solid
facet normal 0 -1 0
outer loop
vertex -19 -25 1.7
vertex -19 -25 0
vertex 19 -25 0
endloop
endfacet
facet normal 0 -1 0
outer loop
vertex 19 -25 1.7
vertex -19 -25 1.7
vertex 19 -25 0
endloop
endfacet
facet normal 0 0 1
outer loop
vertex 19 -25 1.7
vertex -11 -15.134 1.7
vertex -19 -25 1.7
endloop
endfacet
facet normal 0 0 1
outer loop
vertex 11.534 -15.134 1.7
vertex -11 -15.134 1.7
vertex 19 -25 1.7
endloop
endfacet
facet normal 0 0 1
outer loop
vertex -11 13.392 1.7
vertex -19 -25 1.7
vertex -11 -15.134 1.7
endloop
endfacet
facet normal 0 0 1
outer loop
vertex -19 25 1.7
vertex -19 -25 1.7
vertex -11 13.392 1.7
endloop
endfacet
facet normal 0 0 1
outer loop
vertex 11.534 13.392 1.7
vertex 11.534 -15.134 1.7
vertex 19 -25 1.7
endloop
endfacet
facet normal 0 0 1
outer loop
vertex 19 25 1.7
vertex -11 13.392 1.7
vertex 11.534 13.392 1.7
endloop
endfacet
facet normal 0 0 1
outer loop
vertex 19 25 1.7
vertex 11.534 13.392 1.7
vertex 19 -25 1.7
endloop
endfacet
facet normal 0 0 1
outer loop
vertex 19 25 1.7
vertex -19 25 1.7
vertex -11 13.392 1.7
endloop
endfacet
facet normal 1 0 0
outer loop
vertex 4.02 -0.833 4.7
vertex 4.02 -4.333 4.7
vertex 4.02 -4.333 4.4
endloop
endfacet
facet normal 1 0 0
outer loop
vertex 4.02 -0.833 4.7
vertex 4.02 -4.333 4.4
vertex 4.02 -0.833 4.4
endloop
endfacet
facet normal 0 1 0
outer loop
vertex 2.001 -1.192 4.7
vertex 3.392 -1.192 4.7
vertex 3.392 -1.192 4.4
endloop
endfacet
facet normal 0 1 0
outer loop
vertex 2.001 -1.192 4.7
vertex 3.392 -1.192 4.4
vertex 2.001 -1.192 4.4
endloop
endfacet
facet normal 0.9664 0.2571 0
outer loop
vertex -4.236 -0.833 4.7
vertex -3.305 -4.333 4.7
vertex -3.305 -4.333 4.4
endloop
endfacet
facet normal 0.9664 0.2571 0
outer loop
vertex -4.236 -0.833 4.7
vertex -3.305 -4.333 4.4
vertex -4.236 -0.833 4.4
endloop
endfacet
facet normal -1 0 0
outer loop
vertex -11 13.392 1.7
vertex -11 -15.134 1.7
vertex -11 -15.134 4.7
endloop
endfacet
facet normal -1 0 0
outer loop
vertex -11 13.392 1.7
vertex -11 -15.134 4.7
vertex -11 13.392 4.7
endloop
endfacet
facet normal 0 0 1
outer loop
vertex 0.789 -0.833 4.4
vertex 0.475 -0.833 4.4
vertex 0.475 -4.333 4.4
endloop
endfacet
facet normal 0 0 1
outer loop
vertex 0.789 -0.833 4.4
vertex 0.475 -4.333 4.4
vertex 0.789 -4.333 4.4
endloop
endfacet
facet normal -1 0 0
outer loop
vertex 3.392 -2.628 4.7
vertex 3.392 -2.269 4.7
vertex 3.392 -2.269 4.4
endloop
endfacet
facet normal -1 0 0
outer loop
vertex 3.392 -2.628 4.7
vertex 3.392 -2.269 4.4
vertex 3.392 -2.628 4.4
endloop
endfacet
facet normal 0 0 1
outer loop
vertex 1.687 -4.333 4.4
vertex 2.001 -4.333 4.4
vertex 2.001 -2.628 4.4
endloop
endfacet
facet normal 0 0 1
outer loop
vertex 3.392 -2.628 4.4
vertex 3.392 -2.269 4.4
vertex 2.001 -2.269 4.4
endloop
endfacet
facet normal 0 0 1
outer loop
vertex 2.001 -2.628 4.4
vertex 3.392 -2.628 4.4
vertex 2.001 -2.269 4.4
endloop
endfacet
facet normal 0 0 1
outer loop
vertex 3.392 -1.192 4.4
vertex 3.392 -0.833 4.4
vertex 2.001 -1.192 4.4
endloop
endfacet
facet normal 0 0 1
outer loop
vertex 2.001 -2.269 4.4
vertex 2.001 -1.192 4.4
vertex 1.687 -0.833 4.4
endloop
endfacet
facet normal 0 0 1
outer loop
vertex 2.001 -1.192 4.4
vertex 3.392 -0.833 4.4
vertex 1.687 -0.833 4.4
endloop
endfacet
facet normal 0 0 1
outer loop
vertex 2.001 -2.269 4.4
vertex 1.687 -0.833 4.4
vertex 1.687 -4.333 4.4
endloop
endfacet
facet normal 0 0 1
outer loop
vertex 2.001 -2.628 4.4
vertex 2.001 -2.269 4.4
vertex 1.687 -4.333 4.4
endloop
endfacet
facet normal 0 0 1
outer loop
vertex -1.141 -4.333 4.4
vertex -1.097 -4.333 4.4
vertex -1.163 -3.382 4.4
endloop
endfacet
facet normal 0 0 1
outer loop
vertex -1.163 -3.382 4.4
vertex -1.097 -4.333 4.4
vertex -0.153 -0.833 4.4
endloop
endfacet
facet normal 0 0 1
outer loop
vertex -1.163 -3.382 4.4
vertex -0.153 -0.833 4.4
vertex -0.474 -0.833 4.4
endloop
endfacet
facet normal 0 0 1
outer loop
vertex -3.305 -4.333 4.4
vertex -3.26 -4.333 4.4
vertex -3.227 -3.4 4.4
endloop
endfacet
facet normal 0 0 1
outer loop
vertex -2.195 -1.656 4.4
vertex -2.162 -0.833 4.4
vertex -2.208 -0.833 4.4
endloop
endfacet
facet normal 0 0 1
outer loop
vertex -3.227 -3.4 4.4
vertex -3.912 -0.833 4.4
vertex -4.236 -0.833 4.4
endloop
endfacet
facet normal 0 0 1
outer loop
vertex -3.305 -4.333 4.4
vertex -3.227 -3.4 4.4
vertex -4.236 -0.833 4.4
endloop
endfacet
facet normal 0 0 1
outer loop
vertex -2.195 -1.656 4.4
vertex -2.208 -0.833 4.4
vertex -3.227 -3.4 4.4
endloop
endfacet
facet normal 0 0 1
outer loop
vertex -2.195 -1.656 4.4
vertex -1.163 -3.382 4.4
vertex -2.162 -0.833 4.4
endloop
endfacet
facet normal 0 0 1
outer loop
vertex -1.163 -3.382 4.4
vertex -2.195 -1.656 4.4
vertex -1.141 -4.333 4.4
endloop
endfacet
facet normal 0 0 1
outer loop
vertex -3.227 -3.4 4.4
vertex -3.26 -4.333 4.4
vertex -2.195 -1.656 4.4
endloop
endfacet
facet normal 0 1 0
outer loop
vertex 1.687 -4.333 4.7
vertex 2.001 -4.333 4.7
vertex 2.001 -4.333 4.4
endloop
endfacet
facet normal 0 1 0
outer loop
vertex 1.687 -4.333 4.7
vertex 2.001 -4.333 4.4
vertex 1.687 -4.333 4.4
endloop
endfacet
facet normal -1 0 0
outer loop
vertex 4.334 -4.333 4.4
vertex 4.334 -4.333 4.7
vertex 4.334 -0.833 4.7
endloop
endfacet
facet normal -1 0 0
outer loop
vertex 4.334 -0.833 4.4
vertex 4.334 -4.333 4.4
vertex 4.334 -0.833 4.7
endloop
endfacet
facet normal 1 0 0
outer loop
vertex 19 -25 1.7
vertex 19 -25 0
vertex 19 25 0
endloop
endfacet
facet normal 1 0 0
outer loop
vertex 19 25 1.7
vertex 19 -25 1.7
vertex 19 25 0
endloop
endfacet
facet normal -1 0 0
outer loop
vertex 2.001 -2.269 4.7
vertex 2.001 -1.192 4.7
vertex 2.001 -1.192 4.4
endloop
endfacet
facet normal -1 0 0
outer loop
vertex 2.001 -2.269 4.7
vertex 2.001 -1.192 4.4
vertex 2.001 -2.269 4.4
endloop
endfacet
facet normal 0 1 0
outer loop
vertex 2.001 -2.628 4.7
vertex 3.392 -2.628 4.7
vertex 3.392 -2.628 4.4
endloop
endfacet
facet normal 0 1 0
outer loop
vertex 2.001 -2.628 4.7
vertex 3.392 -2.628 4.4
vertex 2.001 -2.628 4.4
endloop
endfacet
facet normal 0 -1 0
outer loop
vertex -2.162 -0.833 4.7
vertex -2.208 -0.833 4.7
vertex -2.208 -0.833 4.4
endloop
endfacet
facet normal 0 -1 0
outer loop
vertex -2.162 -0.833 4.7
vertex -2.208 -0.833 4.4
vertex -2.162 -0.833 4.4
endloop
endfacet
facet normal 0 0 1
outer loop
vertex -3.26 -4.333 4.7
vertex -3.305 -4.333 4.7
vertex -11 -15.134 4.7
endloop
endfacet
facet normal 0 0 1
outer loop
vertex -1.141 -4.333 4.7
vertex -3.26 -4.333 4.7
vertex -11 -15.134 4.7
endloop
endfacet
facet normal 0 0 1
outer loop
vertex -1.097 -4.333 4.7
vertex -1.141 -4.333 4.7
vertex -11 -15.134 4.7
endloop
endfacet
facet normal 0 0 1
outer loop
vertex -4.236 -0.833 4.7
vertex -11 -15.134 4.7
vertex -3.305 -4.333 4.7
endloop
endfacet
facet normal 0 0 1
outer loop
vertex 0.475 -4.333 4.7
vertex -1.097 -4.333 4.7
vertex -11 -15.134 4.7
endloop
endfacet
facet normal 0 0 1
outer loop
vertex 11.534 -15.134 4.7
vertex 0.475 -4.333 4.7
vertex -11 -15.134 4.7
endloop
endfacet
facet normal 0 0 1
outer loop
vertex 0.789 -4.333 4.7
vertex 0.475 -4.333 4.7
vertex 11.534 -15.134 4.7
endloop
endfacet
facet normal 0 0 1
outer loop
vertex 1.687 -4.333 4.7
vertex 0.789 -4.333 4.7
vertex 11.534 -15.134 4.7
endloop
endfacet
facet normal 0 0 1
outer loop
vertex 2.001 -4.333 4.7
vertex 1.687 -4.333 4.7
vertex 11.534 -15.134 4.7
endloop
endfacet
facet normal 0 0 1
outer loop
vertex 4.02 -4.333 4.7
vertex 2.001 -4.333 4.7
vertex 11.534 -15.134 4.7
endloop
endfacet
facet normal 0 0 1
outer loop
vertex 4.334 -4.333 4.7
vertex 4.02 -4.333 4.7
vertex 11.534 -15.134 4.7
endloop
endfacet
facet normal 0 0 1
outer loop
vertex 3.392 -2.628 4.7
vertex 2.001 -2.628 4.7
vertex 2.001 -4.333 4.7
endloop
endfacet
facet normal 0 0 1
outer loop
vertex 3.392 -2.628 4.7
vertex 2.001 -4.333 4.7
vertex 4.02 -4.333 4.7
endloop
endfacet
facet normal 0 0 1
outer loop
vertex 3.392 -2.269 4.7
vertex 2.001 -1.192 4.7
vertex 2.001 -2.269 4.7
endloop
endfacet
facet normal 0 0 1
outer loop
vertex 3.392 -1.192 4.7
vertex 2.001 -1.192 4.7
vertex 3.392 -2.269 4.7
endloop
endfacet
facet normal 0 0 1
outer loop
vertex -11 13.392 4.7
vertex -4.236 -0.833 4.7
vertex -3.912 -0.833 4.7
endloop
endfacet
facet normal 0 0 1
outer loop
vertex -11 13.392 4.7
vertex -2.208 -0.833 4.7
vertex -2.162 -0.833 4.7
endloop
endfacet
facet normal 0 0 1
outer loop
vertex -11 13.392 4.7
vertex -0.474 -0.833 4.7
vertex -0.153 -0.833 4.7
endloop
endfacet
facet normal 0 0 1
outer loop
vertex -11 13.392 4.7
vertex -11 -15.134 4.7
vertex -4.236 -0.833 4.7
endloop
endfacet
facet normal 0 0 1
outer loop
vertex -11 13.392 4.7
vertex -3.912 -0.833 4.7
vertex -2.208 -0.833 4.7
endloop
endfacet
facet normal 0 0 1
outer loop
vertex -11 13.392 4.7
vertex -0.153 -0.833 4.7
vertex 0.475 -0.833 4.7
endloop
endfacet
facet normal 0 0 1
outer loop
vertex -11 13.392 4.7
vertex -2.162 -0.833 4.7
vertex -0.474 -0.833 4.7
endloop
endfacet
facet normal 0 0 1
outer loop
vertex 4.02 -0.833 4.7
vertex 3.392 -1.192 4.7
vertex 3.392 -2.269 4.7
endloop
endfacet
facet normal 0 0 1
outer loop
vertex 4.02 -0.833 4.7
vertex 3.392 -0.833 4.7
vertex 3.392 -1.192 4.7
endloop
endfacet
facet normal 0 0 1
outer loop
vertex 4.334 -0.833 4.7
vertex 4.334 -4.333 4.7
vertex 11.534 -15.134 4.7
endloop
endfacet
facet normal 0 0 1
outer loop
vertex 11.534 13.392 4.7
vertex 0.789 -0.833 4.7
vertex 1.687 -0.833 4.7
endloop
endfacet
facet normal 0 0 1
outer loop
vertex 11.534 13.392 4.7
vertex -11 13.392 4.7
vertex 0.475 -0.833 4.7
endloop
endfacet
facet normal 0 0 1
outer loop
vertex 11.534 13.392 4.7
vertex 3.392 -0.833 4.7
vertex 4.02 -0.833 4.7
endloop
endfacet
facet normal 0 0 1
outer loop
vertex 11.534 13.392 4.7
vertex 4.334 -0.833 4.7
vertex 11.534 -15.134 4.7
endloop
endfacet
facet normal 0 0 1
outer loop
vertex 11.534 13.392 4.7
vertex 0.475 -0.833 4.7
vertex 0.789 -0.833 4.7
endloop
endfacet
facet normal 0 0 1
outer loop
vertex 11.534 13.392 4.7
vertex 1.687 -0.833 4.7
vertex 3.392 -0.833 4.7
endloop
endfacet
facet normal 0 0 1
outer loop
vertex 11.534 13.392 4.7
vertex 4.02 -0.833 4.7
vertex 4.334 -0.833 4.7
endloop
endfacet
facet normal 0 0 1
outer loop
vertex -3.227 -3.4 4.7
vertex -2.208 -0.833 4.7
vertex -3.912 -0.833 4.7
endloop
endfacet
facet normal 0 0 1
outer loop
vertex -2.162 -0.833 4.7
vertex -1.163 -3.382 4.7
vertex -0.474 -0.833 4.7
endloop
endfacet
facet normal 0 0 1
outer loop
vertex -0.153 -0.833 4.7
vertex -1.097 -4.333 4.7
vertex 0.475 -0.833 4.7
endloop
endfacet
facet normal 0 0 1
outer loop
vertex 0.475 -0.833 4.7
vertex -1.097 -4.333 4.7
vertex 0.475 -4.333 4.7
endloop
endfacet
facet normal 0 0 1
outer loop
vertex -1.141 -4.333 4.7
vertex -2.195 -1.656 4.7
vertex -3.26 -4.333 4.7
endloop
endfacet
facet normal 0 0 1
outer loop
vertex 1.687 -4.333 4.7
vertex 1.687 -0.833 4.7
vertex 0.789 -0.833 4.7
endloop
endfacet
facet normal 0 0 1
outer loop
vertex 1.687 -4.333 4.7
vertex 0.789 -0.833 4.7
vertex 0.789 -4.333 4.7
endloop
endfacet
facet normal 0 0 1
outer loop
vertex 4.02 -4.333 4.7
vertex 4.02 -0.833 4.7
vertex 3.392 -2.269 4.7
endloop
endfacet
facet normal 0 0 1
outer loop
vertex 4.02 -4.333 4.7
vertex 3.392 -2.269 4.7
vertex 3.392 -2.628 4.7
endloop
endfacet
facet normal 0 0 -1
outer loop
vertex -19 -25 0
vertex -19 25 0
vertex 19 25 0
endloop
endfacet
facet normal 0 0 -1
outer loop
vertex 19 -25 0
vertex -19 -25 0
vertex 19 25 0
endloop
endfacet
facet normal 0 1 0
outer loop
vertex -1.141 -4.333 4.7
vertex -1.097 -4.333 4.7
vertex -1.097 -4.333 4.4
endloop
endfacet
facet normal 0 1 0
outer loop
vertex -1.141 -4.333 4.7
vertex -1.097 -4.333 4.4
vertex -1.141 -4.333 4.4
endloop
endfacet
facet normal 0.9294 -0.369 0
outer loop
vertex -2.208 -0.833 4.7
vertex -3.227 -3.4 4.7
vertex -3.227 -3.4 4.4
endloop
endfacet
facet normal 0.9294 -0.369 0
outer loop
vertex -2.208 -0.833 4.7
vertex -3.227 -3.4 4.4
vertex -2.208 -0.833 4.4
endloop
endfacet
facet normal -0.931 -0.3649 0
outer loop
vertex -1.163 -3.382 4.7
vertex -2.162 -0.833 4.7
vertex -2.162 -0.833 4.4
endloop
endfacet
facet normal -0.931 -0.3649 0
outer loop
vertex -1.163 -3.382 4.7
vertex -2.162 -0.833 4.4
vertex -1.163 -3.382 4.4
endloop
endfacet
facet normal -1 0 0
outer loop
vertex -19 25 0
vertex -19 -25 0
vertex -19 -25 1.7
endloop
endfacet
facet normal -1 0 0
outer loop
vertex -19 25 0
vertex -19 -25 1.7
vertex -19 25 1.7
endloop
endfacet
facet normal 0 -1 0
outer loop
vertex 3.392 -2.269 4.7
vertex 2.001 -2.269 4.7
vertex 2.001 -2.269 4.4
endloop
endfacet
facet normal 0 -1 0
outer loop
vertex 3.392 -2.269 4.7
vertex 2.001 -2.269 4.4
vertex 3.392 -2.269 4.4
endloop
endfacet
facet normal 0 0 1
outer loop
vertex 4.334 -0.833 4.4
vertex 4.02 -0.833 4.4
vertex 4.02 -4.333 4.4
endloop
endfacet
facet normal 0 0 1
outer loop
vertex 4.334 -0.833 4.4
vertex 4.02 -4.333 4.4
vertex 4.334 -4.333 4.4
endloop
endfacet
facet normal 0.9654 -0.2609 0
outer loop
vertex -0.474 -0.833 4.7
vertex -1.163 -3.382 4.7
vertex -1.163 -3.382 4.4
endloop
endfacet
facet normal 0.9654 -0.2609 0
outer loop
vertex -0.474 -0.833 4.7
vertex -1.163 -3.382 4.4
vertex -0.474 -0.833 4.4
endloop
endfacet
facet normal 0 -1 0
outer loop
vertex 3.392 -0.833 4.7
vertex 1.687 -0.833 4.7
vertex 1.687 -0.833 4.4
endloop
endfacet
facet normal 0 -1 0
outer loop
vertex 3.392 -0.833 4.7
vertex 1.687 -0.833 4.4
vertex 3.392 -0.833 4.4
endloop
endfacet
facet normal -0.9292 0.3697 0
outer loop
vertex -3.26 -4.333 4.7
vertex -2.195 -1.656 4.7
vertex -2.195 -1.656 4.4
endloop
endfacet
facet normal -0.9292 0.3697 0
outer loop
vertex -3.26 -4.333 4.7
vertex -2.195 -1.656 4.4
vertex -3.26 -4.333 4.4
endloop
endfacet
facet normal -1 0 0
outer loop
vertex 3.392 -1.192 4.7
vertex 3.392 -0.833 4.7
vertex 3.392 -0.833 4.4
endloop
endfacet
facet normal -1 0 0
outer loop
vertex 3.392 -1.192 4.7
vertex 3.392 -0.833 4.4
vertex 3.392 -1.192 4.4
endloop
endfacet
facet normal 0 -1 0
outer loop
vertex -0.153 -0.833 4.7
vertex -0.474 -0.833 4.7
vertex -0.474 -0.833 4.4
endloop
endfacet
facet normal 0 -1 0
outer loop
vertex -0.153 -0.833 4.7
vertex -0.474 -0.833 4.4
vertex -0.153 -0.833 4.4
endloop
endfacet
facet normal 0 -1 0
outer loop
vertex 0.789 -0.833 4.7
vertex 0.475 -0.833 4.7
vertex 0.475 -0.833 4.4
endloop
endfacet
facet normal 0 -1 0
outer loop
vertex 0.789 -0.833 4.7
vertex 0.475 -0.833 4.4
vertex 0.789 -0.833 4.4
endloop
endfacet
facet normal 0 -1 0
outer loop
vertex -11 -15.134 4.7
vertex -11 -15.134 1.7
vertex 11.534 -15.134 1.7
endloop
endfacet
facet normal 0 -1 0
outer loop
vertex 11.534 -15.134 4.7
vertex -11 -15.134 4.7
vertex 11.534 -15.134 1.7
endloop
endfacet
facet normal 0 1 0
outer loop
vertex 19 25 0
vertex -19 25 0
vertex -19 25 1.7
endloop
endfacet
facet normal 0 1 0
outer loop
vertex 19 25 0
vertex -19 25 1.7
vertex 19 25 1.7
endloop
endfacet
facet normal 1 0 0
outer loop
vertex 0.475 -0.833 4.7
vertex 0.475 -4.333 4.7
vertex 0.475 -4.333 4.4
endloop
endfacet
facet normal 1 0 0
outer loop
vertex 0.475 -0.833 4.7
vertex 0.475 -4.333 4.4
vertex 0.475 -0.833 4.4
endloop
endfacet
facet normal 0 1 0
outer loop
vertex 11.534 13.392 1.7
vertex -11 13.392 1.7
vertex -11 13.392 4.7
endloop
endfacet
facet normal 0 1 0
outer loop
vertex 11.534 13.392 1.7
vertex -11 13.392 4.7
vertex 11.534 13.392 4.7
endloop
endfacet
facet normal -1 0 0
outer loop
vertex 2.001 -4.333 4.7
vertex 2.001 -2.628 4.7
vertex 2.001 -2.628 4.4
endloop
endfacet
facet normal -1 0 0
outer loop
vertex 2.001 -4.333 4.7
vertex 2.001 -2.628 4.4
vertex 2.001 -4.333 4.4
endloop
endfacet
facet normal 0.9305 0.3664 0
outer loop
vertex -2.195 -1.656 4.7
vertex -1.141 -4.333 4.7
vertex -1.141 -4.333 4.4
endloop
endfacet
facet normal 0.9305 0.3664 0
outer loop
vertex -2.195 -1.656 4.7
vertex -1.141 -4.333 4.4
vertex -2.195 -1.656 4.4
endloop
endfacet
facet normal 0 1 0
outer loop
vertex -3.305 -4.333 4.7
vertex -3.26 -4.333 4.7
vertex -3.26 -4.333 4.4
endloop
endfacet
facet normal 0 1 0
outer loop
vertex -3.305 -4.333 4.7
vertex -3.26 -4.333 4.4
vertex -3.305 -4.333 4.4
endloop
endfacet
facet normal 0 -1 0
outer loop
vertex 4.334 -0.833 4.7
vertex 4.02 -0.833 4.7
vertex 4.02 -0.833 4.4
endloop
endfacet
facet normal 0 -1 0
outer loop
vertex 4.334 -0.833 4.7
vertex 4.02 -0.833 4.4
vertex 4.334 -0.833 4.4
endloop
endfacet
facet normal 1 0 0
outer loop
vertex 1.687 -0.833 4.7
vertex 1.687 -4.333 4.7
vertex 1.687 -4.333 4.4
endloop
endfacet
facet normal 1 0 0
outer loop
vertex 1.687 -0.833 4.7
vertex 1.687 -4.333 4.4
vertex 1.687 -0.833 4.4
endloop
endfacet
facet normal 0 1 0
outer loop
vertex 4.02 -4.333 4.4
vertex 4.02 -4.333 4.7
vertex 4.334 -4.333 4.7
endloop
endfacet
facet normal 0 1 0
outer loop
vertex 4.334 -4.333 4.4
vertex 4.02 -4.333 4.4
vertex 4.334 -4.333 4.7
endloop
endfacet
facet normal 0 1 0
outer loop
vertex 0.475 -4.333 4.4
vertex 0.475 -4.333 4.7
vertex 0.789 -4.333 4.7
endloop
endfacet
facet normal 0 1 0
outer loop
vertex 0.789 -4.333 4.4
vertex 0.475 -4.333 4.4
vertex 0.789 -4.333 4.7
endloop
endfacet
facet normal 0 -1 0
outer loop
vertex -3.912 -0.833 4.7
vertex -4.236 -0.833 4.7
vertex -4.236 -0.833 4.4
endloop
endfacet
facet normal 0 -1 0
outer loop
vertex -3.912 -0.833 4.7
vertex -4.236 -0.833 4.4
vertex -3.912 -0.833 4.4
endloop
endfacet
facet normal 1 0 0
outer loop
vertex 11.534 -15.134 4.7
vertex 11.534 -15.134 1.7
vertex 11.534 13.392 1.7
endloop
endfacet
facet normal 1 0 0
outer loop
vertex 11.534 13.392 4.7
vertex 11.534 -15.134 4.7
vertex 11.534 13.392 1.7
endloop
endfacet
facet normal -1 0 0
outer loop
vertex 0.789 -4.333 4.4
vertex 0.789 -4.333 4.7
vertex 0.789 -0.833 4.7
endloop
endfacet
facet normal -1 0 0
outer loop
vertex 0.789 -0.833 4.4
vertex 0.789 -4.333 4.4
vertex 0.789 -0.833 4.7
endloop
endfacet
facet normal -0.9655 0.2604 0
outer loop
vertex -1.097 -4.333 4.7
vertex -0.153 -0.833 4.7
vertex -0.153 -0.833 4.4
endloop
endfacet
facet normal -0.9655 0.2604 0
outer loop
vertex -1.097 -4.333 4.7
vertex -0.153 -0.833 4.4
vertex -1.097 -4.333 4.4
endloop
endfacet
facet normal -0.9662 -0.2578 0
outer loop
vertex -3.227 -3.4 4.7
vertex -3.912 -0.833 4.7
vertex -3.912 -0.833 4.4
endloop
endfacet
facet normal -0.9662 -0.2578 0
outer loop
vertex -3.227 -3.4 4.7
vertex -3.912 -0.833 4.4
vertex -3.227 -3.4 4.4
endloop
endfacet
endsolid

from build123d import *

# Parameters (mm, degrees)
SKETCH1_W           = 38
SKETCH1_H           = 50
BOSS_EXTRUDE1_DEPTH = 1.7
SKETCH3_W           = 22.534452401
SKETCH3_H           = 28.525832834
BOSS_EXTRUDE2_DEPTH = 3
SKETCH4_W           = 0.314102564
SKETCH4_H           = 3.5
CUT_EXTRUDE2_DEPTH  = 0.3


with BuildPart() as part:
    # Sketch1 → Boss-Extrude1 (new body)
    with BuildSketch(Plane.XY):
        Rectangle(SKETCH1_W, SKETCH1_H)
    extrude(amount=BOSS_EXTRUDE1_DEPTH)

    # Sketch3 → Boss-Extrude2 (add)
    with BuildSketch(Plane.XY.offset(1.7)):
        with Locations((0.266789104, -0.871264125)):
            Rectangle(SKETCH3_W, SKETCH3_H)
    extrude(amount=BOSS_EXTRUDE2_DEPTH)

    # Sketch4 → Cut-Extrude2 (cut)
    with BuildSketch(Plane.XY.offset(4.7)):
        Polygon((-4.236247821, -0.83301235), (-3.91162843, -0.83301235), (-3.226632437, -3.399819241), (-2.207902469, -0.83301235), (-2.162329552, -0.83301235), (-1.162529873, -3.382291197), (-0.47402827, -0.83301235), (-0.152914488, -0.83301235), (-1.096624424, -4.33301235), (-1.141496219, -4.33301235), (-2.194581155, -1.656129338), (-3.260286283, -4.33301235), (-3.305158078, -4.33301235), align=None)
        with Locations((0.632341922, -2.58301235)):
            Rectangle(SKETCH4_W, SKETCH4_H)
        Polygon((1.686829102, -0.83301235), (3.391957307, -0.83301235), (3.391957307, -1.191986709), (2.000931666, -1.191986709), (2.000931666, -2.268909786), (3.391957307, -2.268909786), (3.391957307, -2.627884145), (2.000931666, -2.627884145), (2.000931666, -4.33301235), (1.686829102, -4.33301235), align=None)
        with Locations((4.177213717, -2.58301235)):
            Rectangle(SKETCH4_W, SKETCH4_H)
    extrude(amount=-CUT_EXTRUDE2_DEPTH, mode=Mode.SUBTRACT)


solid = part.part
